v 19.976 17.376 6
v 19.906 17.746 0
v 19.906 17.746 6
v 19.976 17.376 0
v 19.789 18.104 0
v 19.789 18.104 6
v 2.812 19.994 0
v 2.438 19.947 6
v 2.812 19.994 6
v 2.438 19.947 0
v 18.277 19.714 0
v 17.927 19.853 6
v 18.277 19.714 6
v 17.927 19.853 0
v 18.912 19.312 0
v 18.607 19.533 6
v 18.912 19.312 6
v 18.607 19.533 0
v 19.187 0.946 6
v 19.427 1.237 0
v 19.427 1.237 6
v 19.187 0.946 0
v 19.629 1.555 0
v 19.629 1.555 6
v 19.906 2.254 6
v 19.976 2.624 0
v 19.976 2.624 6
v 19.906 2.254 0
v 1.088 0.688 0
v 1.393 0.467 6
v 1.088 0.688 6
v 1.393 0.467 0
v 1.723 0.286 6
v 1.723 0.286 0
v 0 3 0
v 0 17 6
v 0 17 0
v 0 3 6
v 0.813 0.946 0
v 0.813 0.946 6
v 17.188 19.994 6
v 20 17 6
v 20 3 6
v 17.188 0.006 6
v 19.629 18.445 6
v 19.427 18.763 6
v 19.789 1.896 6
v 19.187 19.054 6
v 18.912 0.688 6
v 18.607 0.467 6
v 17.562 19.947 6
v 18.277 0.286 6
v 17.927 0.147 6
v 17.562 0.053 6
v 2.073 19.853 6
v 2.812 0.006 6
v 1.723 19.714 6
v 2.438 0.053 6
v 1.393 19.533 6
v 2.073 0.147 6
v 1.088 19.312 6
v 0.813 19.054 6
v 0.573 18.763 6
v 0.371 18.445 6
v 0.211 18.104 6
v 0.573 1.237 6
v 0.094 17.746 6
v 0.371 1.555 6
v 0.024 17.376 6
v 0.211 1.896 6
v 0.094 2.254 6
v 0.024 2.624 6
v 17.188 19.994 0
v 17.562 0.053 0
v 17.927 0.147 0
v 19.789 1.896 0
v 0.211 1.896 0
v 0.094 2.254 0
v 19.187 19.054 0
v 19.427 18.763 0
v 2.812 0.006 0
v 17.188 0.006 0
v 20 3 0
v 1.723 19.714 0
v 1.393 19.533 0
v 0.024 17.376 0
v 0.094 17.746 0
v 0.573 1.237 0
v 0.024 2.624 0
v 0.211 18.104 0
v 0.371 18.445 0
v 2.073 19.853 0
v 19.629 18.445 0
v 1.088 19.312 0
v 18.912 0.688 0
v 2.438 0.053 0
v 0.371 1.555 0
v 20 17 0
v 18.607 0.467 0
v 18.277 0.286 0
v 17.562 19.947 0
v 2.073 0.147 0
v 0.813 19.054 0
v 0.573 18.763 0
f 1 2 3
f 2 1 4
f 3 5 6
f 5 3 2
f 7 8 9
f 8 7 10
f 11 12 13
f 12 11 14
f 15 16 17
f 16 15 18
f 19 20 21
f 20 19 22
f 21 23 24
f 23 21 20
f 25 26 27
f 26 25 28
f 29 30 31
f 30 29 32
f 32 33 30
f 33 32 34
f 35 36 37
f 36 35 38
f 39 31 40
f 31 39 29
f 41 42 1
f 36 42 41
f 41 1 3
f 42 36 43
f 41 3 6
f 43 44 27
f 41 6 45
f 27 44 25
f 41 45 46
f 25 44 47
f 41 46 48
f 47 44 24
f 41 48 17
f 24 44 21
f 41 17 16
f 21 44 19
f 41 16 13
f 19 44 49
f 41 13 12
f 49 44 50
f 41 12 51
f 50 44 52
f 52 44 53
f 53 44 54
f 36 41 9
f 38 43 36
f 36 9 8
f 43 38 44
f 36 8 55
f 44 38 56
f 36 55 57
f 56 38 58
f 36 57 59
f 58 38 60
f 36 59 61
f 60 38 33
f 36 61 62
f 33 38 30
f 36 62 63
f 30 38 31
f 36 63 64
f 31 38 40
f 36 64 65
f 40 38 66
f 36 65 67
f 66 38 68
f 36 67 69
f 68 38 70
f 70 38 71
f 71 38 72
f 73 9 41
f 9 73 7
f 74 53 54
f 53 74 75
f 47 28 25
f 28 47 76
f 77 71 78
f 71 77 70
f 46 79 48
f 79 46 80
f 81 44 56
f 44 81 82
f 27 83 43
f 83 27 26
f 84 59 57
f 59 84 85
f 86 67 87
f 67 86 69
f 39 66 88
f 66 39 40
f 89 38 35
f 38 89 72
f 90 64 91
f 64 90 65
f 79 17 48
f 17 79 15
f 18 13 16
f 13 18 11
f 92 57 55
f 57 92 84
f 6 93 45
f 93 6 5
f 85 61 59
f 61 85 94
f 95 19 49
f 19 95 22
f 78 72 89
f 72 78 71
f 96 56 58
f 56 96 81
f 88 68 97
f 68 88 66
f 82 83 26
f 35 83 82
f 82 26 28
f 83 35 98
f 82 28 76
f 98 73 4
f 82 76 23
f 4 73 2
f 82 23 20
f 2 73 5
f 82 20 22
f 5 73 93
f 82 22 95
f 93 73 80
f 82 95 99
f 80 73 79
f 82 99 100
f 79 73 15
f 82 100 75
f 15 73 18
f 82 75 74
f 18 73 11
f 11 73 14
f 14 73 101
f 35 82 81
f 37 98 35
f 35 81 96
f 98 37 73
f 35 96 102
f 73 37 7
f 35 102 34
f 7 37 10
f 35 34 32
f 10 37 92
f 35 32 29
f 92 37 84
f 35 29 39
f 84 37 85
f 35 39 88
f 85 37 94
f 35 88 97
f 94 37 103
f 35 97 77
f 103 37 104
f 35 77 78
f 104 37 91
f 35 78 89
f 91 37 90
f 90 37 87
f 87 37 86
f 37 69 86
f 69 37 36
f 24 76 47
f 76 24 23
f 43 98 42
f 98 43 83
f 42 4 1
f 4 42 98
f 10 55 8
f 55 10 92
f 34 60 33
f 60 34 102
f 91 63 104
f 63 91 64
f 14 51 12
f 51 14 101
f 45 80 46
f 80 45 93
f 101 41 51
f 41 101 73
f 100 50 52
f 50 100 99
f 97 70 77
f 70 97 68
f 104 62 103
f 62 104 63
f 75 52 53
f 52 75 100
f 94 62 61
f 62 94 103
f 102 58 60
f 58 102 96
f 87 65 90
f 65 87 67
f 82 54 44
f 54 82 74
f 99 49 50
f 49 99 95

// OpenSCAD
// file: ../../lib/primitive/square_torus.scad
include <./rounded_cube.scad>
include <./rounded_square.scad>
include <../config/constants.scad>

module rounded_corner(size, flat_top=false, flat_bottom=false) {
  rotate_extrude(angle=90) {
    translate([$rounding, 0, 0]) {
      rounded_square(size, flat_top=flat_top, flat_bottom=flat_bottom);
    }
  }
}

module square_torus(size, girth, flat_top=false, flat_bottom=false) {
  shaft_size = [
    size[0] - ($rounding + girth) * 2,
    size[1] - ($rounding + girth) * 2,
    size[2] - $rounding * 2 ,
  ];

  union() {
    // Bottom
    translate([girth + $rounding, 0, 0]) {
      rotate(a=[90, 0, 90]) {
        linear_extrude(shaft_size[0]) {
          rounded_square([girth, size[2]], flat_top=flat_top, flat_bottom=flat_bottom);
        }
      }
    }
    // Left
    translate([0, shaft_size[1] + girth + $rounding, 0]) {
      rotate(a=[90, 0, 0]) {
        linear_extrude(shaft_size[1]) {
          rounded_square([girth, size[2]], flat_top=flat_top, flat_bottom=flat_bottom);
        }
      }
    }
    // Top 
    translate([girth + $rounding, shaft_size[1] + girth + $rounding * 2, 0]) {
      rotate(a=[90, 0, 90]) {
        linear_extrude(shaft_size[0]) {
          rounded_square([girth, size[2]], flat_top=flat_top, flat_bottom=flat_bottom);
        }
      }
    }
    // Right
    translate([shaft_size[0] + girth + $rounding * 2, shaft_size[1] + girth + $rounding, 0]) {
      rotate(a=[90, 0, 0]) {
        linear_extrude(shaft_size[1]) {
          rounded_square([girth, size[2]], flat_top=flat_top, flat_bottom=flat_bottom);
        }
      }
    }

    translate([girth + $rounding, girth + $rounding, 0]) {
      // Bottom left corner
      rotate(180) {
        rounded_corner([girth, size[2]], flat_top=flat_top, flat_bottom=flat_bottom);
      }
      // Bottom right corner
      translate([shaft_size[0], 0, 0]) {
        rotate(270) {
          rounded_corner([girth, size[2]], flat_top=flat_top, flat_bottom=flat_bottom);
        }
      }
      // Top left corner
      translate([0, shaft_size[1], 0]) {
        rotate(90) {
          rounded_corner([girth, size[2]], flat_top=flat_top, flat_bottom=flat_bottom);
        }
      }
      // Top right corner
      translate([shaft_size[0], shaft_size[1], 0]) {
        rounded_corner([girth, size[2]], flat_top=flat_top, flat_bottom=flat_bottom);
      }
    }
  } 
}
// file: ../../lib/config/constants.scad
// Shared constants reflect things that are true for the whole model not just a single component.
// They should by definition be required by multiple components.
$fn = 10;

$abs_filament = false;

$wall_thickness = 2;
$wall_rect = [$wall_thickness, $wall_thickness];
$inner_wall_thickness = 1;

$bleed = 0.01;

$padding = 0.5;
$padding_rect = [$padding * 2, $padding * 2];

$card_padding = 1.5;

$inset = 6;
$cutout_fraction = 0.6;

$rounding = 3;

// TODO are both needed?
$lid_height = 2;
$cutout_lid_height = 2;

$trapezoid_inset = 1;
// file: ../../lib/primitive/rounded_square.scad
include <../config/constants.scad>

module rounded_square(size, flat_top=false, flat_bottom=false) {
  assert(!(flat_top && flat_bottom), "Flat top and flat bottom are exclusive");

  rounding_height = flat_top || flat_bottom 
    ? $rounding 
    : $rounding * 2;

  offset = flat_bottom ? 0 : $rounding;

  inner_size = [
    size[0] - $rounding * 2,
    size[1] - rounding_height,
  ];

  minkowski() {
    translate([$rounding, offset]) {
      square(inner_size);
    }
    if (flat_top ) {
      difference() {
        circle($rounding);
        translate([-$rounding, 0]) {
          square([$rounding * 2, $rounding]);
        }
      }
    } else if (flat_bottom) {
      difference() {
        circle($rounding);
        translate([-$rounding, -$rounding]) {
          square([$rounding * 2, $rounding]);
        }
      }
    } else {
      circle($rounding);
    }
  }
}
// file: ../../lib/image/svg_icon.scad
include <../config/constants.scad>

module svg_icon(file, depth=1, icon_size, target_size) {
  assert(file, "File argument missing");
  
  icon_scale = [
    target_size[0] / icon_size[0],
    target_size[1] / icon_size[1],
  ];

  linear_extrude(depth) {
    scale(icon_scale) {
      import(file);
    }
  }
}
// file: ../../lib/primitive/elephant_foot.scad
include <./rounded_cube.scad>
include <./square_torus.scad>
include <../config/constants.scad>

// TODO investigate poor performance

// TODO use bleed_top|bottom help with differencing a foot
module elephant_foot(
  size, 
  flat_top=false, 
  flat_bottom=false,
  rounded_top=false,
  rounded_bottom=false,
  use_bleed=false
) {
  foot_top = !(flat_top || rounded_top);
  foot_bottom = !(flat_bottom || rounded_bottom);
  assert(foot_top || foot_bottom, "Foot can only have flat/rounded top or bottom not both");

  girth = ($rounding + $bleed) * 2;

  torus_size = [
    size[0] + (girth - $rounding) * 2,
    size[1] + (girth - $rounding) * 2,
    $rounding + $bleed
  ];

  torus_offset = [
    0 - (torus_size[0] - size[0]) / 2,
    0 - (torus_size[1] - size[1]) / 2,
  ];

  foot_size = [
    size[0],
    size[1],
    $rounding + (use_bleed ? $bleed: 0)
  ];

  foot_top_height = foot_top ? $rounding : 0;
  foot_bottom_height = foot_bottom ? $rounding : 0;

  inner_size = [
    size[0] - $rounding * 2,
    size[1] - $rounding * 2,
    size[2] - max(0, foot_top_height -1) - max(0, foot_bottom_height - 1),
  ];

  union() {
    if (foot_bottom) {
      difference() {
        translate([0, 0, 0 - (use_bleed && foot_bottom ? $bleed: 0)]) {
          rounded_cube(foot_size, flat=true);
        }
        translate(torus_offset) {
          square_torus(torus_size, girth, flat_top=true);
        }
      }
    }

    translate([$rounding, $rounding, foot_bottom_height]) {
      rounded_cube(
        inner_size, 
        flat_top=flat_top || foot_top, 
        flat_bottom=flat_bottom || foot_bottom
      );
    }

    if (foot_top) {
      translate([0, 0, inner_size[2] - 1 + foot_bottom_height]) {
        difference() {
          rounded_cube(foot_size, flat=true);
          translate([torus_offset[0], torus_offset[1], -$bleed]) {
            square_torus(torus_size, girth, flat_bottom=true);
          }
        }
      }
    }
  }
}
// file: ../../lib/primitive/rounded_cube.scad
include <./rounded_square.scad>
include <../config/constants.scad>

// Render a rounded cube
// flat_top: do not round the top edges
// flat_bottom: do not round the bottom edges
// flat: equals flat_top && flat_bottom
// 
// Limitations:
// requires height > $rounding * 2
// flat_top || flat_bottom requires height > $rounding
// flat_top && flat_bottom requires height > $bleed
module rounded_cube(
  size, 
  flat=false, 
  flat_top=false, 
  flat_bottom=false,
  side_rounding=-1
) {
  _flat = flat || (flat_top && flat_bottom);
  _flat_top = flat_top || flat;
  _flat_bottom = flat_bottom || flat;
  _rounding = min($rounding, size[2] / 2);
  _side_rounding = side_rounding > -1 ? side_rounding: $rounding;

  assert(_side_rounding >= $rounding, "side rounding cannot be less than rounding");

  top_height = _flat_top ? 0: _rounding;
  bottom_height = _flat_bottom ? 0: _rounding;

  cube_size = [
    size[0] - _rounding * 2,
    size[1] - _rounding * 2,
    size[2] - (top_height + bottom_height)
  ];

  if (_flat_top && _flat_bottom) {
     linear_extrude(cube_size[2]) {
       rounded_square([size[0], size[1]]);
     }
   } else {
     minkowski() {
       translate([_rounding, _rounding, bottom_height]) {
         if (_side_rounding != _rounding) {
           linear_extrude(cube_size[2]) {
             rounded_square([cube_size[0], cube_size[1]], $rounding=_side_rounding);
           }
         } else {
           cube(cube_size);
         }
       }

       if (_flat_top) {
         difference() {
           sphere(_rounding);
           cylinder(_rounding, _rounding, _rounding);
         }
       } else if (_flat_bottom) {
         difference() {
           sphere(_rounding);
           translate ([0, 0, -_rounding]) {
             cylinder(_rounding, _rounding, _rounding);
           }
         }
       } else {
         sphere(_rounding);
       }
    }
  }
}
// main file
include <../../lib/primitive/rounded_cube.scad>
include <../../lib/primitive/elephant_foot.scad>
include <../../lib/image/svg_icon.scad>

// Config
$fn = 50;
$wall_thickness = 4;

skip_cubes = false;

// Attributes
min_floor_height = 2;
cube_cutout_height = 4;

// Derived Attributes
// TODO compute based on nested component sizes
dashboard_size = [
  20,
  20,
  min_floor_height + cube_cutout_height
];

module letter(l, letter_size, halign="center", valign="center") {
  font = "Teutonic";
  letter_height = 1;

  // Use linear_extrude() to make the letters 3D objects as they
  // are only 2D shapes when only using text()
  linear_extrude(height = letter_height) {
    text(l, size=letter_size, font=font, halign=halign, valign=valign, $fn=16);
  }
}

module magnet_hole() {
  magnet_height = 1;

  translate([magnet_diameter / 2, magnet_diameter / 2, -magnet_height]) {
    cylinder(h=magnet_height + $bleed, d=magnet_diameter);
  }
}

module action_tray() {
}

module player_dashboard() {
  // Positioning Attributes
  
  // Model
  difference() {
    rounded_cube(dashboard_size, flat=true);
 
    // Place all trays inside wall bufer
    translate([$wall_thickness, $wall_thickness, 0]) {
      // Place action tray first
      action_tray();
    }
  }
}

player_dashboard();
